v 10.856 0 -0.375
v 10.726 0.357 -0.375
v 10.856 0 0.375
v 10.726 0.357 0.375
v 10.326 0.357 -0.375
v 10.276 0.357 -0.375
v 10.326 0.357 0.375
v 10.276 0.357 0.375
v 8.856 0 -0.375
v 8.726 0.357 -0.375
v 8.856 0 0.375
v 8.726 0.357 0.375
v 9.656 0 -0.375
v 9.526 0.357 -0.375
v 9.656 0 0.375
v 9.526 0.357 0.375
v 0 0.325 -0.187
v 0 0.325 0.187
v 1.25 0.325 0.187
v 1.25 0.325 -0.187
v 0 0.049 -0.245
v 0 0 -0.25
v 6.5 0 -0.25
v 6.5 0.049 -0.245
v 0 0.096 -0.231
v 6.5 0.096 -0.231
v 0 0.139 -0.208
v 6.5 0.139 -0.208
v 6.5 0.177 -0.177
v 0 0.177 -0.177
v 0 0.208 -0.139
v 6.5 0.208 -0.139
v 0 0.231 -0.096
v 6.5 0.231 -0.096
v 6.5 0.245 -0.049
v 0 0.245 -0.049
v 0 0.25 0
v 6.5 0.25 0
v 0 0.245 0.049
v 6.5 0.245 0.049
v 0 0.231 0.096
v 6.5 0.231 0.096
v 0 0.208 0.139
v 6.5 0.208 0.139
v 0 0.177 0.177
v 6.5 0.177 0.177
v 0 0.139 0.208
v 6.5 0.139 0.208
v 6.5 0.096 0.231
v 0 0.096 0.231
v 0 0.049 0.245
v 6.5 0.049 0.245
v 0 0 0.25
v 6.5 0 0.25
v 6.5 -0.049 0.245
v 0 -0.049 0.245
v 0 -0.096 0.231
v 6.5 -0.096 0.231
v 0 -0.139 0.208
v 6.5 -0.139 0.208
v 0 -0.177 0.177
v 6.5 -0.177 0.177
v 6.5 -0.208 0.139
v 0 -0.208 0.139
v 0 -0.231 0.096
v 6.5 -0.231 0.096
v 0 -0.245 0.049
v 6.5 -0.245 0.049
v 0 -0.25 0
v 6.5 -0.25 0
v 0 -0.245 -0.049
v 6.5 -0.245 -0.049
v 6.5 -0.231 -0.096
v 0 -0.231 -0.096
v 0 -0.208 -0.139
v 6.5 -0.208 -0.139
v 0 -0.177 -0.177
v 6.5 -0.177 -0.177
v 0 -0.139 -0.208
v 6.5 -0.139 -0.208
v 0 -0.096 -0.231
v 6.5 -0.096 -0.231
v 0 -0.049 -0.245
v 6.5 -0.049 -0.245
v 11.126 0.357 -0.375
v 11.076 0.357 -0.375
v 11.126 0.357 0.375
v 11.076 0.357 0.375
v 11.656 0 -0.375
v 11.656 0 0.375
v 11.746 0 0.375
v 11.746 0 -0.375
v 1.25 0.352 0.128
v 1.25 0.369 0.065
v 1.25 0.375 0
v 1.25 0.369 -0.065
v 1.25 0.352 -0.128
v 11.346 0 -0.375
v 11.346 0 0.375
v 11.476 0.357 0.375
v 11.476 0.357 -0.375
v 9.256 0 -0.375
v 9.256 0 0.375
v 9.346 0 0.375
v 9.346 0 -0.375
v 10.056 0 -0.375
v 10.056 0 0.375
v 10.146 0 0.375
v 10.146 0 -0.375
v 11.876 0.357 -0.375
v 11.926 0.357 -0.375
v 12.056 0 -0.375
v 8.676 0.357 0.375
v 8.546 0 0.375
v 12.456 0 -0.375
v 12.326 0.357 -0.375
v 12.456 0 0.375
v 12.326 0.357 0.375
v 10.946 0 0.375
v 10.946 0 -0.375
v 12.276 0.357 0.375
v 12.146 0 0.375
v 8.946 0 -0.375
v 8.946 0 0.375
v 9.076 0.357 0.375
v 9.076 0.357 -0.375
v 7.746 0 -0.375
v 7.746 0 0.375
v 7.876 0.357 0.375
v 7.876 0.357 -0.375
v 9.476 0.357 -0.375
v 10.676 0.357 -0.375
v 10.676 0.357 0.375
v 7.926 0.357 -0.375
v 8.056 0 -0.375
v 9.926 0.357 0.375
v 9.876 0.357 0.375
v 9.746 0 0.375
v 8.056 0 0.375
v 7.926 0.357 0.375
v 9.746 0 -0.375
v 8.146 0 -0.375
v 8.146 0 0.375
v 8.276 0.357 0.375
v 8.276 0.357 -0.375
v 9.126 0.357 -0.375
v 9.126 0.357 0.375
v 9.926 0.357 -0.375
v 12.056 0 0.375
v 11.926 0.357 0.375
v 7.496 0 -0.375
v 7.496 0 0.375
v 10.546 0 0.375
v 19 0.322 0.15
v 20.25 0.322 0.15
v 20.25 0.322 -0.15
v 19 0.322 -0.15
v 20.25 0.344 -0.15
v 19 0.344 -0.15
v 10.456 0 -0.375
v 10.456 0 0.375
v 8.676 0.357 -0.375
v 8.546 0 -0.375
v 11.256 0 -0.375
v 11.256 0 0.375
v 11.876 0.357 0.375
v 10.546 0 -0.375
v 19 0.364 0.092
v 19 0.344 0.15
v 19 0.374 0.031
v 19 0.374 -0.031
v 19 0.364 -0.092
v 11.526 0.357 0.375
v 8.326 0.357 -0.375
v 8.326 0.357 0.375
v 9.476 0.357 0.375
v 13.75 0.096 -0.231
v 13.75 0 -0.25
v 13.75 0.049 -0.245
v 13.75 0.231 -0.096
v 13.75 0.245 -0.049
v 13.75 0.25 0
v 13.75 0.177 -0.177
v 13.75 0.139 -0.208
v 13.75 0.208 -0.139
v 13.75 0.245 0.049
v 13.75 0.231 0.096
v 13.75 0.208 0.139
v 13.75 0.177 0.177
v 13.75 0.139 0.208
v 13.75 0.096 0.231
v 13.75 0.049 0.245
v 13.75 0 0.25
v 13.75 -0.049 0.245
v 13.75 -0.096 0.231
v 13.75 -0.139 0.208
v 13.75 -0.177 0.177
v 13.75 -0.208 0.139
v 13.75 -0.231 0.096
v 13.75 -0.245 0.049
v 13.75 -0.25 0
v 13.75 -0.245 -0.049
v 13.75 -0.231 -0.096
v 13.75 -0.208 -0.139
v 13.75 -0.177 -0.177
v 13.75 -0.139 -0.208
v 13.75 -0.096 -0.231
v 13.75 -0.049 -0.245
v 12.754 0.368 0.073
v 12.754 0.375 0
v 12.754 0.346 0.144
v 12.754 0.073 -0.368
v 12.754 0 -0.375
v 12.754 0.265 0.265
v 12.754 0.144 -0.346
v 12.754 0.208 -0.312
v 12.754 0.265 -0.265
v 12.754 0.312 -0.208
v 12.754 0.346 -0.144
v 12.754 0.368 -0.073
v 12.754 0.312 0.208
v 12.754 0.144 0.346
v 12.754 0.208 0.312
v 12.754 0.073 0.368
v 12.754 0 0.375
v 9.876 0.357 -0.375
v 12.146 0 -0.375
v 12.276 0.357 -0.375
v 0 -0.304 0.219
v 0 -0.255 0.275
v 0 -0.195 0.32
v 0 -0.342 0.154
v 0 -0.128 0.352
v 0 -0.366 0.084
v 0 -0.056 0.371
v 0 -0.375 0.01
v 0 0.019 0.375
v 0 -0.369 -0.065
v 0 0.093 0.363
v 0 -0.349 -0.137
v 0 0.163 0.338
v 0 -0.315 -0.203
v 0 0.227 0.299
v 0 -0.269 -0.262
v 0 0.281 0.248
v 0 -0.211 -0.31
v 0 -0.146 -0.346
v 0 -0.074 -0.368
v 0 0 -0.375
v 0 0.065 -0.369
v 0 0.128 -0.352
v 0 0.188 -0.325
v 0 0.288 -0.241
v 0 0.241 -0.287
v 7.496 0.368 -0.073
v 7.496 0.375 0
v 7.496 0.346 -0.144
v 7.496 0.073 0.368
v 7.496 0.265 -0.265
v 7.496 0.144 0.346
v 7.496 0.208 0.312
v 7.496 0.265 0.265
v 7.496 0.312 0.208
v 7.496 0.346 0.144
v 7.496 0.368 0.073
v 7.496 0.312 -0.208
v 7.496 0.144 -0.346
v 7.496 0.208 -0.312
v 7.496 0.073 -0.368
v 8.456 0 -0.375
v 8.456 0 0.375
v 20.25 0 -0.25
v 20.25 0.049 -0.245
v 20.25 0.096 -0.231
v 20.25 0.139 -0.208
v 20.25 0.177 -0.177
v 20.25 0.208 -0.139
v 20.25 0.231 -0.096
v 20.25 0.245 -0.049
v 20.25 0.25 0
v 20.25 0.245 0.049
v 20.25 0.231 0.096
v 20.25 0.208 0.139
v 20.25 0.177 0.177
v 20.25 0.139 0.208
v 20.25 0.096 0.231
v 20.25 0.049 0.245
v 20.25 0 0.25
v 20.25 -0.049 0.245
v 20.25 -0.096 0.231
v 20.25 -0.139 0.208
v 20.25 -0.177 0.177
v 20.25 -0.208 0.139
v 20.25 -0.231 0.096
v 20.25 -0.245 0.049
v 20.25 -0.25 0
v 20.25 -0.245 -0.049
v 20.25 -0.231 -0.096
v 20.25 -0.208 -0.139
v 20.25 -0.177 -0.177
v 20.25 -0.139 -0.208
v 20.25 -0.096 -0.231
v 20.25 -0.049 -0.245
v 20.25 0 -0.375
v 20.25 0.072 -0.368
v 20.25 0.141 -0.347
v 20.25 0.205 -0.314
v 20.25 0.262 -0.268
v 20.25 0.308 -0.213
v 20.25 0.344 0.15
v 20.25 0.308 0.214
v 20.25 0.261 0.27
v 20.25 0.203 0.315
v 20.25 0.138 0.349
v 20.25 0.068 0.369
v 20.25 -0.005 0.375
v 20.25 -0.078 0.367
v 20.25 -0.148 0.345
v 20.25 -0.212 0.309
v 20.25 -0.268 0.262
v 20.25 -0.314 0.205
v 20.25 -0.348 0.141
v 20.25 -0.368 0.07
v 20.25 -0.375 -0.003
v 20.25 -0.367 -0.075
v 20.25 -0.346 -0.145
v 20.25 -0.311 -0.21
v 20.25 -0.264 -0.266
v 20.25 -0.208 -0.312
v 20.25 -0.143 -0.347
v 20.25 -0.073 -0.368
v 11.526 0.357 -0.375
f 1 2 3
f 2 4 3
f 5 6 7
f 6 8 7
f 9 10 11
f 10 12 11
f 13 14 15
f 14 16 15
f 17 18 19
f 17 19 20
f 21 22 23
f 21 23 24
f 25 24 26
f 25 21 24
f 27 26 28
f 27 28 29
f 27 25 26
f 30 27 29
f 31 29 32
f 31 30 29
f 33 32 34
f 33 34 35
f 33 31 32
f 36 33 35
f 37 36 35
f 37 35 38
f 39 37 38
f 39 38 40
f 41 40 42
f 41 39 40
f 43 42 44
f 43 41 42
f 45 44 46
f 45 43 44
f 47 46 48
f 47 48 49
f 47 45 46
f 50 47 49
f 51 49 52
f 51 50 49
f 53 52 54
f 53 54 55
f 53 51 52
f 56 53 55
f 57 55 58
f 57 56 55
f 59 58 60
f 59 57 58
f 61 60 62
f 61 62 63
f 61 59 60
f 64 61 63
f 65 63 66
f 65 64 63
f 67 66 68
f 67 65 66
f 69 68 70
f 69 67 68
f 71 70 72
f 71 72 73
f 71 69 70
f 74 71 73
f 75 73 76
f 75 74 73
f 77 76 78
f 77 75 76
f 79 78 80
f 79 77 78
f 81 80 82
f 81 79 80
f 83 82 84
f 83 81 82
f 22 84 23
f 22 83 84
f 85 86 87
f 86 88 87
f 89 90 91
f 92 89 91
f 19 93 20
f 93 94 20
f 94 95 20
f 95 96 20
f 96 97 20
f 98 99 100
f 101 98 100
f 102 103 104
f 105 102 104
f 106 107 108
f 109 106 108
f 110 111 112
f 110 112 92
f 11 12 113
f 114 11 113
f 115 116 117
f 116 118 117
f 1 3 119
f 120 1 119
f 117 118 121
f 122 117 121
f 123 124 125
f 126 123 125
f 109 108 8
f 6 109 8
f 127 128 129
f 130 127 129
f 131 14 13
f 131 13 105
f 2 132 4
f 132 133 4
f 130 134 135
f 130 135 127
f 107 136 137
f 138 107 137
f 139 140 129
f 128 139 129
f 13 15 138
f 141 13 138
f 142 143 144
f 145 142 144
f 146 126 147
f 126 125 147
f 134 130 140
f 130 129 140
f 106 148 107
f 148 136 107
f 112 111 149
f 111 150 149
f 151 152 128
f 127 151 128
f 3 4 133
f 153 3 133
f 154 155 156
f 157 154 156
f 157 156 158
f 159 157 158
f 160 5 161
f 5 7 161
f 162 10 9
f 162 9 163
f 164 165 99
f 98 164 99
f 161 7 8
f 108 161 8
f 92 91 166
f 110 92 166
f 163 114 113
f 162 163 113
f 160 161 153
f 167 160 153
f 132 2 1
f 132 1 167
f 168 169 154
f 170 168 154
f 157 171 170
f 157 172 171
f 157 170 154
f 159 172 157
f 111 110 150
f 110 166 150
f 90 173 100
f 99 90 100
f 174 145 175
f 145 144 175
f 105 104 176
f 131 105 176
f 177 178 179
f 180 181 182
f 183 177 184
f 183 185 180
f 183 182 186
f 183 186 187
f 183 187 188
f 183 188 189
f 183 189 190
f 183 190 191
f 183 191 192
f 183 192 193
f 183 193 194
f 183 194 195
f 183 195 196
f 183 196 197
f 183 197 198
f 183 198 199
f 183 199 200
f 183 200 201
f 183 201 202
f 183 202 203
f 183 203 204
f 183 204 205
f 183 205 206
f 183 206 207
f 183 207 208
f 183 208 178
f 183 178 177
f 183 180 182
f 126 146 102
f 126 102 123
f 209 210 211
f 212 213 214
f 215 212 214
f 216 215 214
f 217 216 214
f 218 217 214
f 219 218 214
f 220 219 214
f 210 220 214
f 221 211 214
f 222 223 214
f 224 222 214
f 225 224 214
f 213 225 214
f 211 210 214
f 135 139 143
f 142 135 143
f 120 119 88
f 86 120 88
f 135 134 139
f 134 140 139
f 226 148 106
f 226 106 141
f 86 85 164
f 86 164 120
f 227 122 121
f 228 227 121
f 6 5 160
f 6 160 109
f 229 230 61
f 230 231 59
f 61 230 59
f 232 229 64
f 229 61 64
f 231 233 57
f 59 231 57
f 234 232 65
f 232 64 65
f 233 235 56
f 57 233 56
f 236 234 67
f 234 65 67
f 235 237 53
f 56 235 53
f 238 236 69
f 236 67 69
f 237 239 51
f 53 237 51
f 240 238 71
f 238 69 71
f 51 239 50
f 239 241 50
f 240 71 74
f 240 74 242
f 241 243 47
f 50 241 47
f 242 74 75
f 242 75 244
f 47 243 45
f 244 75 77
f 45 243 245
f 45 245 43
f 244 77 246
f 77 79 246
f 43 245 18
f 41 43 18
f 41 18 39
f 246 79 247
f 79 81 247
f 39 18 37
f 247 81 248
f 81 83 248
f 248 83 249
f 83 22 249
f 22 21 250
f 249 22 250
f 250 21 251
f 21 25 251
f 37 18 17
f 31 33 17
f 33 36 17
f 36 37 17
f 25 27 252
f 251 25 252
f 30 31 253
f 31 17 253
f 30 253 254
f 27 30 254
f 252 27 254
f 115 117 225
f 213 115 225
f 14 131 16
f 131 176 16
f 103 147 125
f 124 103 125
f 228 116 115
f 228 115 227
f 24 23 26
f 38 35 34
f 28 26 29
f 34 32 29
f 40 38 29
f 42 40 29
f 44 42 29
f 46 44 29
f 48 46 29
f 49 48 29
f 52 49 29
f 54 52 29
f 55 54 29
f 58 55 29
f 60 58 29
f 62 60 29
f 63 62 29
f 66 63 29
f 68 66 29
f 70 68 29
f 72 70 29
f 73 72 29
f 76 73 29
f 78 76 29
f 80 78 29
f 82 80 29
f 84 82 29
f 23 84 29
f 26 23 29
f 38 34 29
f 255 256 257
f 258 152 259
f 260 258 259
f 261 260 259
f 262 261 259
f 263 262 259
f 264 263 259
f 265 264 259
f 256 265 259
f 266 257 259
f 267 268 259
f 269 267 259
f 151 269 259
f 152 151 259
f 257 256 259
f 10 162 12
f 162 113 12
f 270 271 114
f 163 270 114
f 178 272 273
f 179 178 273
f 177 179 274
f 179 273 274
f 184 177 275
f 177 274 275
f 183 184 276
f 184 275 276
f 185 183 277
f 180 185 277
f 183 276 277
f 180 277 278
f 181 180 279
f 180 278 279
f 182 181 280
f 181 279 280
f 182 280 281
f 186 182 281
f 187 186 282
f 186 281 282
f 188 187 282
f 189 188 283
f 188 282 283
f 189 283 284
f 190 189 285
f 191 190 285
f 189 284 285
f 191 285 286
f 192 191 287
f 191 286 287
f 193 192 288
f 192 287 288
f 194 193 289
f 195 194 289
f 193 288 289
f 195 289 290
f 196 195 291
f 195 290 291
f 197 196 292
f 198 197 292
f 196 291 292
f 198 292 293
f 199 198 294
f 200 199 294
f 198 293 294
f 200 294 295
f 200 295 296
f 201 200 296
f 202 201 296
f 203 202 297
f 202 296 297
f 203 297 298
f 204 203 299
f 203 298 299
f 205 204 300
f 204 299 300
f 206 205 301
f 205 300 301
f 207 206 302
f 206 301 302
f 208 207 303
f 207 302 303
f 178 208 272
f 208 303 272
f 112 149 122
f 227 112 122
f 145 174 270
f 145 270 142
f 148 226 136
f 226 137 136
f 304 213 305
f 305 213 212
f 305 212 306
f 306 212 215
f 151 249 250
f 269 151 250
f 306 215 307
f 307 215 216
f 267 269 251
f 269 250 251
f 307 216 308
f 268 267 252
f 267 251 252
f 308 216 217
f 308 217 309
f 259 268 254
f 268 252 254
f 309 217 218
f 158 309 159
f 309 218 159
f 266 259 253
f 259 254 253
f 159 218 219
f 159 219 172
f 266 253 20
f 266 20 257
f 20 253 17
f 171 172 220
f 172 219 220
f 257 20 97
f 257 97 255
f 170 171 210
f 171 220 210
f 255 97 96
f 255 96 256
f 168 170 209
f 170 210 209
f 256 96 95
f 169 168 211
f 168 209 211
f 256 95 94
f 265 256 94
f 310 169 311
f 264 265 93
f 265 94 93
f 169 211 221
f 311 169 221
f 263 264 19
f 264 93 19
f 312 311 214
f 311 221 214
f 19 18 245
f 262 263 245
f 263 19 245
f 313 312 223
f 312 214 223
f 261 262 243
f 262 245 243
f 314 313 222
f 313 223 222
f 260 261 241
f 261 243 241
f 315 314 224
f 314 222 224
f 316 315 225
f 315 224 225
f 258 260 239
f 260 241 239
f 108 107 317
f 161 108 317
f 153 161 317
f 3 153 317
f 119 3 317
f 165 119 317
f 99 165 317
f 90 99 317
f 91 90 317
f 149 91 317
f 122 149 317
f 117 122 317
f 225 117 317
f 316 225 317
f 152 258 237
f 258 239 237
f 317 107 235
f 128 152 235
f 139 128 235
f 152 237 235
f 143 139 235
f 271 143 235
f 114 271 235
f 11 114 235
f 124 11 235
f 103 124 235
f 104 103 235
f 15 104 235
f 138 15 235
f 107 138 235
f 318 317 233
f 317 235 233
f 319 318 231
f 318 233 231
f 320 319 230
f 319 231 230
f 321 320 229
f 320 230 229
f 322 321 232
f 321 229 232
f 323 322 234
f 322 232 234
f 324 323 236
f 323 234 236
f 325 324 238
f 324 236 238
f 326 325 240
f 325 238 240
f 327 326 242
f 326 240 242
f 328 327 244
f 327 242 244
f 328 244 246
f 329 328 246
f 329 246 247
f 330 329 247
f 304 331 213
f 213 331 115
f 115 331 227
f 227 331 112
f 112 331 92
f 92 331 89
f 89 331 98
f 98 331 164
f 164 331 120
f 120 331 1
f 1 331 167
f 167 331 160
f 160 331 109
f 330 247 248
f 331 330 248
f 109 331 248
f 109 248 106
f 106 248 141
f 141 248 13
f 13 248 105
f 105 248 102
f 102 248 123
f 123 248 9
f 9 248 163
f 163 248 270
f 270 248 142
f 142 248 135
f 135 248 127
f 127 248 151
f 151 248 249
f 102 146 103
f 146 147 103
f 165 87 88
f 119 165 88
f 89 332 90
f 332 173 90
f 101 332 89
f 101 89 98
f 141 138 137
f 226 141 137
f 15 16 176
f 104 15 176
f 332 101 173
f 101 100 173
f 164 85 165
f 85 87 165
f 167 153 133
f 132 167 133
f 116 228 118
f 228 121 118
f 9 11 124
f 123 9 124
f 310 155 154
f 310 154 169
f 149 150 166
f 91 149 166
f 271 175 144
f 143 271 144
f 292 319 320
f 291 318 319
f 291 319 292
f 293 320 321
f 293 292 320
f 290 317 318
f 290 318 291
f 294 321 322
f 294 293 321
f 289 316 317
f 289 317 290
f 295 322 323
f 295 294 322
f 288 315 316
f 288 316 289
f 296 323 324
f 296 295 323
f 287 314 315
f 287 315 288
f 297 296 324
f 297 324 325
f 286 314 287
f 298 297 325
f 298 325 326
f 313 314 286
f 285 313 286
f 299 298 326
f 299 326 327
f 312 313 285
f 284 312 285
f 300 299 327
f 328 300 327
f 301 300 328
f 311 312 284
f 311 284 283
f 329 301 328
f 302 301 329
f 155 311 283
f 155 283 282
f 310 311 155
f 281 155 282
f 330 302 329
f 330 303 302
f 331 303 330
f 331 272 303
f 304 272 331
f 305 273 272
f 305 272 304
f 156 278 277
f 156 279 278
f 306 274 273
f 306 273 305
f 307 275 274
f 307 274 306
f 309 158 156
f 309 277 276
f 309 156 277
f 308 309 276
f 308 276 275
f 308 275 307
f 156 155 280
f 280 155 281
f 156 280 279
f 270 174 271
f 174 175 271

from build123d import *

# Parameters (mm, degrees)
SKETCH1_R               = 0.375
BOSS_EXTRUDE1_DEPTH     = 20.25
SKETCH3_R               = 0.25
CUT_EXTRUDE1_DEPTH      = 6.5
SKETCH4_R               = 0.25
CUT_EXTRUDE2_DEPTH      = 6.5
SKETCH5_W               = 0.3
SKETCH5_H               = 0.1
CUT_EXTRUDE3_DEPTH      = 1.25
SKETCH6_W               = 0.5
SKETCH6_H               = 0.1
CUT_EXTRUDE4_DEPTH      = 1.25
SKETCH7_W               = 5.25772593
SKETCH7_H               = 0.43012496
CUT_EXTRUDE5_DEPTH      = 1.375
CUT_EXTRUDE5_DEPTH_BACK = 1.375
BOSS_EXTRUDE2_DEPTH     = 0.375
LPATTERN1_COUNT         = 12
LPATTERN1_PITCH         = 0.4


with BuildPart() as part:
    # Sketch1 → Boss-Extrude1 (new body)
    with BuildSketch(Plane(origin=(0, 0, 0), x_dir=(0, 0, -1), z_dir=(1, 0, 0))):
        Circle(SKETCH1_R)
    extrude(amount=BOSS_EXTRUDE1_DEPTH)

    # Sketch3 → Cut-Extrude1 (cut)
    with BuildSketch(Plane(origin=(0, 0, 0), x_dir=(0, 0, -1), z_dir=(1, 0, 0))):
        Circle(SKETCH3_R)
    extrude(amount=CUT_EXTRUDE1_DEPTH, mode=Mode.SUBTRACT)

    # Sketch4 → Cut-Extrude2 (cut)
    with BuildSketch(Plane(origin=(20.25, 0, 0), x_dir=(0, 0, -1), z_dir=(1, 0, 0))):
        Circle(SKETCH4_R)
    extrude(amount=-CUT_EXTRUDE2_DEPTH, mode=Mode.SUBTRACT)

    # Sketch5 → Cut-Extrude3 (cut)
    with BuildSketch(Plane(origin=(20.25, 0, 0), x_dir=(0, 0, -1), z_dir=(1, 0, 0))):
        with Locations((0, 0.371911734)):
            Rectangle(SKETCH5_W, SKETCH5_H)
    extrude(amount=-CUT_EXTRUDE3_DEPTH, mode=Mode.SUBTRACT)

    # Sketch6 → Cut-Extrude4 (cut)
    with BuildSketch(Plane(origin=(0, 0, 0), x_dir=(0, 0, -1), z_dir=(1, 0, 0))):
        with Locations((0, 0.375)):
            Rectangle(SKETCH6_W, SKETCH6_H)
    extrude(amount=CUT_EXTRUDE4_DEPTH, mode=Mode.SUBTRACT)

    # Sketch7 → Cut-Extrude5 (cut, two sides)
    with BuildSketch(Plane.XY) as cut_extrude5_sk:
        with Locations((10.125, 0.21506248)):
            Rectangle(SKETCH7_W, SKETCH7_H)
    extrude(amount=CUT_EXTRUDE5_DEPTH, mode=Mode.SUBTRACT)
    extrude(cut_extrude5_sk.sketch, amount=-CUT_EXTRUDE5_DEPTH_BACK, mode=Mode.SUBTRACT)

    # Sketch8 → Boss-Extrude2 (add, symmetric)
    with BuildSketch(Plane.XY):
        Polygon((7.746137035, 0), (7.875912836, 0.356556082), (7.925912836, 0.356556082), (8.055688636, 0), align=None)
    boss_extrude2 = extrude(amount=BOSS_EXTRUDE2_DEPTH, both=True)

    # LPattern1: Boss-Extrude2 ×12
    with Locations(*[(i * LPATTERN1_PITCH, 0, 0) for i in range(1, LPATTERN1_COUNT)]):
        add(boss_extrude2)


solid = part.part
